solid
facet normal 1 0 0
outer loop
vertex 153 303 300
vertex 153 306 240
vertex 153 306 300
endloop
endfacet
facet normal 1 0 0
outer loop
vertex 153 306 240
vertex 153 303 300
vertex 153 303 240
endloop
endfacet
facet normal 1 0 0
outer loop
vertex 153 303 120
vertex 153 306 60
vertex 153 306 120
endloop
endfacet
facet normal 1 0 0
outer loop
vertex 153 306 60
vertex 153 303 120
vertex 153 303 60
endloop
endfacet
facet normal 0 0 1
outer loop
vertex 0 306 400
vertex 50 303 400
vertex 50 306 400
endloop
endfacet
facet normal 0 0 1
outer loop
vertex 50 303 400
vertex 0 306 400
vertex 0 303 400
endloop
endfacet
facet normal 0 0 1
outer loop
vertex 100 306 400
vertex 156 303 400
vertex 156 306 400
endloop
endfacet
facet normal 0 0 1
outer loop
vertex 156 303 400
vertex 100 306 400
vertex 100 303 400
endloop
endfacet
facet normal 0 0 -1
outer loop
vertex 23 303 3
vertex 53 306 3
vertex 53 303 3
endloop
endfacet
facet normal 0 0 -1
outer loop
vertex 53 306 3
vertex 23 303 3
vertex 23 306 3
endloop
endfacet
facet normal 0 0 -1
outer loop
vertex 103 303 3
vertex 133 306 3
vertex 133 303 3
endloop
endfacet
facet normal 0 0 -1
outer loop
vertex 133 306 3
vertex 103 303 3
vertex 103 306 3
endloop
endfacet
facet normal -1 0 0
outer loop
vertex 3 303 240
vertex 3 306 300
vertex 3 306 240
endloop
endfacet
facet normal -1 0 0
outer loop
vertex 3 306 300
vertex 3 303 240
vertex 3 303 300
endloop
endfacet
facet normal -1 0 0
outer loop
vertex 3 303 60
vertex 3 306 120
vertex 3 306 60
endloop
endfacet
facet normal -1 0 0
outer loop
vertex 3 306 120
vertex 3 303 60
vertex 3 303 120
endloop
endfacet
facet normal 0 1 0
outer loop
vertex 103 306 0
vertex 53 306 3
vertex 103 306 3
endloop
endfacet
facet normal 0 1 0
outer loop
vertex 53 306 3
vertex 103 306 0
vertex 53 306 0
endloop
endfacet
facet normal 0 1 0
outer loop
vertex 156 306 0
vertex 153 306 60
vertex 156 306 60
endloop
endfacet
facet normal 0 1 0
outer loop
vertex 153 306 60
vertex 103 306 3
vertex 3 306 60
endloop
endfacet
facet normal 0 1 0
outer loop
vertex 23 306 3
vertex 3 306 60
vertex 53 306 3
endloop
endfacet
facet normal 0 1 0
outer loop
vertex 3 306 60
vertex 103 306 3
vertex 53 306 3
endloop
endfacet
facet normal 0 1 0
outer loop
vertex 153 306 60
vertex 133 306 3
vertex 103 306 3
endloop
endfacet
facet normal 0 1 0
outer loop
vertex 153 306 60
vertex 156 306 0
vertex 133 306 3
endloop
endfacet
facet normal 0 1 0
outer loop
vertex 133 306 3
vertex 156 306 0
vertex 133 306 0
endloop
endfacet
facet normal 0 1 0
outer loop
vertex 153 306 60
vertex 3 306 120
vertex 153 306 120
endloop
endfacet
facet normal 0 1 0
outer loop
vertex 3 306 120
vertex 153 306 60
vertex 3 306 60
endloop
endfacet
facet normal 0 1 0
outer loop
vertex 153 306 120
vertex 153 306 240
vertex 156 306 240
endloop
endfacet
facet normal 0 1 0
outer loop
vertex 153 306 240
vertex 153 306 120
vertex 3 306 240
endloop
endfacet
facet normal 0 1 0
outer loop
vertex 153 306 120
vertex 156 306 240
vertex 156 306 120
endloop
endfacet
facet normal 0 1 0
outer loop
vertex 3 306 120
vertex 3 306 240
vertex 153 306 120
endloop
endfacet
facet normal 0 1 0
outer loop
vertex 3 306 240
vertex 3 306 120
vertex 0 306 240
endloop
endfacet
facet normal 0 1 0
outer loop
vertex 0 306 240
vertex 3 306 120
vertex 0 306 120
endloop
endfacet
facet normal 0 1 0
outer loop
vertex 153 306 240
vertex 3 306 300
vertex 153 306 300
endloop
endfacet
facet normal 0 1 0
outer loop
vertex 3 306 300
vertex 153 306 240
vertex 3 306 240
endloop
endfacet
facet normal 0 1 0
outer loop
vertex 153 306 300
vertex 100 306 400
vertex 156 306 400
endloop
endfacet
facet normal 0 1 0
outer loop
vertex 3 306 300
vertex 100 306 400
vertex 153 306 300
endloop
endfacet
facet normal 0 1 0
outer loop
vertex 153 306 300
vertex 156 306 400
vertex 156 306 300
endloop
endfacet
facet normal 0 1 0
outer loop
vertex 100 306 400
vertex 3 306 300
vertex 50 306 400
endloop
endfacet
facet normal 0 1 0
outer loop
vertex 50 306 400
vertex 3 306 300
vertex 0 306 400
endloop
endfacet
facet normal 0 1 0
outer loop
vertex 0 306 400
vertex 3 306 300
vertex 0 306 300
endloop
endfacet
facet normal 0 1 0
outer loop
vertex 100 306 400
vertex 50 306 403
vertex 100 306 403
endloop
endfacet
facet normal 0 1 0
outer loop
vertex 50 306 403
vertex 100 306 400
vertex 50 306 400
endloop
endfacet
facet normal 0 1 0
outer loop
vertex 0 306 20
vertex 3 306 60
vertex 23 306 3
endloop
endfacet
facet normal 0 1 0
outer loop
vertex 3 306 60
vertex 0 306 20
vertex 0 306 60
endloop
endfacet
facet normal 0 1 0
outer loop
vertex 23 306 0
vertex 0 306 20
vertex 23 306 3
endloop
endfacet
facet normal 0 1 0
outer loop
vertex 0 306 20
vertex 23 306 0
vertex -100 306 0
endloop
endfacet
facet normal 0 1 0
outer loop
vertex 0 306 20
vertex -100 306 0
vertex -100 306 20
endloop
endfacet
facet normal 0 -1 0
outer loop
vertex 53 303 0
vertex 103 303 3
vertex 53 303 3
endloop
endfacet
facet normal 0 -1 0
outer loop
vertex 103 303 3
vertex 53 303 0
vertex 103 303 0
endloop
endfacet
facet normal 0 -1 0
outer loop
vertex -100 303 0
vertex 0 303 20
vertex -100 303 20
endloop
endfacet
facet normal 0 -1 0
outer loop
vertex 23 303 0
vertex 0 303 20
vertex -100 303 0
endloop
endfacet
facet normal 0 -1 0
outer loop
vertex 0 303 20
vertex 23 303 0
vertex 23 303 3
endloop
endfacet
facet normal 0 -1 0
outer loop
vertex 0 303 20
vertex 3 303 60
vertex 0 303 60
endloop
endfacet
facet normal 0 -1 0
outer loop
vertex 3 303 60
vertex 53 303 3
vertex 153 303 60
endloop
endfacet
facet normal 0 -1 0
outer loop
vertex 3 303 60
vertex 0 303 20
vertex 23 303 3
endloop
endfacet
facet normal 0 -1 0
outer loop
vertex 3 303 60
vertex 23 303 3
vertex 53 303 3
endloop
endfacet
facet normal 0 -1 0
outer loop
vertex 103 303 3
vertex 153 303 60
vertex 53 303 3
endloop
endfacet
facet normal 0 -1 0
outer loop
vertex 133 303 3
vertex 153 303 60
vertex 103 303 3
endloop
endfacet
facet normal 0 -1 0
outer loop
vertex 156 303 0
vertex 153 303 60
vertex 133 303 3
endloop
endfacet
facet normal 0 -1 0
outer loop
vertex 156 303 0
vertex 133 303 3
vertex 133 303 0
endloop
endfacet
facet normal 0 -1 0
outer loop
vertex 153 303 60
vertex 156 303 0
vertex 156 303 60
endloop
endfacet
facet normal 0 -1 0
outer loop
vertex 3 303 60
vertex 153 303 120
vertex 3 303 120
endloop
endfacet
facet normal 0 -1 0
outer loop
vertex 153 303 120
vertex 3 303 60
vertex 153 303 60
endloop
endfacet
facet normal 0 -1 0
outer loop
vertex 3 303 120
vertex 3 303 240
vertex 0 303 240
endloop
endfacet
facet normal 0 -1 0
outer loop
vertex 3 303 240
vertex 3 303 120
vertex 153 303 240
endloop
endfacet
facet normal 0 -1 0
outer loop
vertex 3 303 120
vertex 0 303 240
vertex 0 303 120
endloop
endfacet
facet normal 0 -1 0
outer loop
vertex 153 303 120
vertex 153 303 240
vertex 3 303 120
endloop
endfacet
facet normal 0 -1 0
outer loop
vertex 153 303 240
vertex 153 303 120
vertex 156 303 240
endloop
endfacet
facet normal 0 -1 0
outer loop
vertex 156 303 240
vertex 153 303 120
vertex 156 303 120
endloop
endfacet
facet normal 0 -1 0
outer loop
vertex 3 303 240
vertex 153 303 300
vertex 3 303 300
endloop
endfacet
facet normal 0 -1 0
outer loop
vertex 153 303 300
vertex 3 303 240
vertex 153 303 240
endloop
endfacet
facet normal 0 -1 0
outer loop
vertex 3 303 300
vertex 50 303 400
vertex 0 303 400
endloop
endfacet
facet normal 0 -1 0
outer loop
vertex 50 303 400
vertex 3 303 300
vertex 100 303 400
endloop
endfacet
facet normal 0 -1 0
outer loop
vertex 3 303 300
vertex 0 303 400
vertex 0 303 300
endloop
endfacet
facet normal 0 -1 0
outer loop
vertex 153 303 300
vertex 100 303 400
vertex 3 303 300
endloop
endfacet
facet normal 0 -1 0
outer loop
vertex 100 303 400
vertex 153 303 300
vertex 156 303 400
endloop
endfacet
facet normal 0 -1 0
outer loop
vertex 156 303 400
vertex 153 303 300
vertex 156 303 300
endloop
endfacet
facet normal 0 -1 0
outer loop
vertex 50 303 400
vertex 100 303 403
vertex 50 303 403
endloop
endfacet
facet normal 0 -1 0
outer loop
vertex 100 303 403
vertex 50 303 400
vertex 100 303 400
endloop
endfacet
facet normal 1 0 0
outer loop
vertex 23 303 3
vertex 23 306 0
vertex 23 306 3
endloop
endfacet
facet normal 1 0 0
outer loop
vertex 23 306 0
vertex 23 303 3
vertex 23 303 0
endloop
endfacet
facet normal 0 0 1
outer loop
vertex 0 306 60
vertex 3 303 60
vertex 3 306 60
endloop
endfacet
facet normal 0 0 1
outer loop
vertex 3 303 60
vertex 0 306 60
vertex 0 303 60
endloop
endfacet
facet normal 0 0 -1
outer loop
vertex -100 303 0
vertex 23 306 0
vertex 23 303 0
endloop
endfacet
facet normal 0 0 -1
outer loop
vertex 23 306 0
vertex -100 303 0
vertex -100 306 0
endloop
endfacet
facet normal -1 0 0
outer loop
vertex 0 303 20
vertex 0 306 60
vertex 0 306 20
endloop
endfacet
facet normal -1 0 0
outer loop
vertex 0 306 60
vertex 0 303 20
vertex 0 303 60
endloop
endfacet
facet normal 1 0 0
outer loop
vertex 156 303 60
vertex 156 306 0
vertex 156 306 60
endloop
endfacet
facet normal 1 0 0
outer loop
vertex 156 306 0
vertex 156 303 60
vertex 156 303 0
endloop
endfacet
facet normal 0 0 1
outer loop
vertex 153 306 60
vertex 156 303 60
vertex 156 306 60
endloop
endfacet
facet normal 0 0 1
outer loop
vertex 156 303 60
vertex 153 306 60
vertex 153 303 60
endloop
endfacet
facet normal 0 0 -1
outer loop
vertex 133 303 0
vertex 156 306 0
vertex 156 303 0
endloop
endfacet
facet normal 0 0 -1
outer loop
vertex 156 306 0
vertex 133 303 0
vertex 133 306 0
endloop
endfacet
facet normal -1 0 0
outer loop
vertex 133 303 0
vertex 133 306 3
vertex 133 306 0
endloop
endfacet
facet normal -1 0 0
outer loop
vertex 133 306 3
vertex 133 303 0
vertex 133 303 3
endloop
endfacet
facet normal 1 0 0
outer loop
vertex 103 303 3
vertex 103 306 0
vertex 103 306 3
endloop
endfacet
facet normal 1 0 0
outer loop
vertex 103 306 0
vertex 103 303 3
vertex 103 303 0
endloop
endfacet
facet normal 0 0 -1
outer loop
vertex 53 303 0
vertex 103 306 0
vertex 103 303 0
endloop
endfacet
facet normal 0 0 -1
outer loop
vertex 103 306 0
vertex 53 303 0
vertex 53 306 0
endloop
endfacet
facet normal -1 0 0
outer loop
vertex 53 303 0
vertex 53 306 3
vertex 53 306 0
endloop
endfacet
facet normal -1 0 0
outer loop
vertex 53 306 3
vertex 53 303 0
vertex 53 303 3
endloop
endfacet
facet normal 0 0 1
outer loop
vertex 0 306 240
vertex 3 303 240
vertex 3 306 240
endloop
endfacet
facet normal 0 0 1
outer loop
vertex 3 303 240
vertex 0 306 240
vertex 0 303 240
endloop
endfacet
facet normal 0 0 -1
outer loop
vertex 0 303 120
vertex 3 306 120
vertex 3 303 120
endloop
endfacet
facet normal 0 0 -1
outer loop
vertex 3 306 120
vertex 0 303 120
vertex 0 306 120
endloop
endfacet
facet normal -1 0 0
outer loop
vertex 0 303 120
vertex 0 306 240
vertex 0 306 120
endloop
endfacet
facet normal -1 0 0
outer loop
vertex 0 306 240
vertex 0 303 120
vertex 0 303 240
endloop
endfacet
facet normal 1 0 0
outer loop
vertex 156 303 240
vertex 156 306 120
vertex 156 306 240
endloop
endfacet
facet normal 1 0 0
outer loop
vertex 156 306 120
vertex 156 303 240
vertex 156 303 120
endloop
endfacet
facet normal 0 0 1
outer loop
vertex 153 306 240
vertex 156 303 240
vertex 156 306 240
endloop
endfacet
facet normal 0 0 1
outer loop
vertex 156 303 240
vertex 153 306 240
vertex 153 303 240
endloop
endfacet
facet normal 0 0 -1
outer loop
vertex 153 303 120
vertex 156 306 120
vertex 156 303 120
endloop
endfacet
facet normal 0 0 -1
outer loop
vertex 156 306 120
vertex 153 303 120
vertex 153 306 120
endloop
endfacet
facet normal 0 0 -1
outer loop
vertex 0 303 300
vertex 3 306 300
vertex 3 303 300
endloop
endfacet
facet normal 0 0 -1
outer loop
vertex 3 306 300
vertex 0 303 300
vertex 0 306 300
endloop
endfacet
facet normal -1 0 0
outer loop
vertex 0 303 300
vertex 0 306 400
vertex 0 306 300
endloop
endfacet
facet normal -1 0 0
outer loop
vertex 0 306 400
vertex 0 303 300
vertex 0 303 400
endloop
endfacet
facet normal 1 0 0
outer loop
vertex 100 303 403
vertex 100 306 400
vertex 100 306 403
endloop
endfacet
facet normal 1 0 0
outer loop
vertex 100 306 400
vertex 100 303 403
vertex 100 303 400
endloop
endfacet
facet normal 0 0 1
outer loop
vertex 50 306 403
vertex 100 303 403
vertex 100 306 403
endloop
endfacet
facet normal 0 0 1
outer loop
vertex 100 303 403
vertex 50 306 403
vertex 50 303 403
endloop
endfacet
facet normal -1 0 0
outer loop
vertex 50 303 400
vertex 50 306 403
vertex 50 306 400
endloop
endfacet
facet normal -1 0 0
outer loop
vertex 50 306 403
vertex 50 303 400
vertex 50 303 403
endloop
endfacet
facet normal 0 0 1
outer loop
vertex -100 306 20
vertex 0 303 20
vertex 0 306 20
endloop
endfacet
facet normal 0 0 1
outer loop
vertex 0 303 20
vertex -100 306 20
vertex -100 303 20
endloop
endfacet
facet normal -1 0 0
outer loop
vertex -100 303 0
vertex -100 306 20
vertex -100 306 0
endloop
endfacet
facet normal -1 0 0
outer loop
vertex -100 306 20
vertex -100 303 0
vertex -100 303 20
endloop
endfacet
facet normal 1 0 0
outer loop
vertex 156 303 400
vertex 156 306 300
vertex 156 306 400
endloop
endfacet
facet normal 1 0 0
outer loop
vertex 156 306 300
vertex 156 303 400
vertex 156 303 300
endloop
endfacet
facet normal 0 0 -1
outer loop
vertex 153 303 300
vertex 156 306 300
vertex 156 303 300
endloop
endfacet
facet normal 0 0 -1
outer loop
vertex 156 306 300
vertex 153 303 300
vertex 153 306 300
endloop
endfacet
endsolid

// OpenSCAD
module part06(){
translate([3,303,3]) color("pink") cube([150,3,397]);
translate([0,303,0]) color("pink") cube([23,3,60]);
translate([133,303,0]) color("pink") cube([23,3,60]);
translate([53,303,0]) color("pink") cube([50,3,3]);
    translate([0,303,120]) color("pink") cube([3,3,120]);
    translate([153,303,120]) color("pink") cube([3,3,120]);
    translate([0,303,300]) color("pink") cube([3,3,100]);
    
    // connector top
    translate([50,303,400]) color("pink") cube([50,3,3]);
    // corresponding element on part05
    //translate([5,10,40]) color("pink") cube([5,0.3,0.3]);
    
    
    // stabilisation
    translate([-100,303,0]) color("pink") cube([100,3,20]);
    
    // connectors right
    translate([153,303,300]) color("pink") cube([3,3,100]);
}

part06();
